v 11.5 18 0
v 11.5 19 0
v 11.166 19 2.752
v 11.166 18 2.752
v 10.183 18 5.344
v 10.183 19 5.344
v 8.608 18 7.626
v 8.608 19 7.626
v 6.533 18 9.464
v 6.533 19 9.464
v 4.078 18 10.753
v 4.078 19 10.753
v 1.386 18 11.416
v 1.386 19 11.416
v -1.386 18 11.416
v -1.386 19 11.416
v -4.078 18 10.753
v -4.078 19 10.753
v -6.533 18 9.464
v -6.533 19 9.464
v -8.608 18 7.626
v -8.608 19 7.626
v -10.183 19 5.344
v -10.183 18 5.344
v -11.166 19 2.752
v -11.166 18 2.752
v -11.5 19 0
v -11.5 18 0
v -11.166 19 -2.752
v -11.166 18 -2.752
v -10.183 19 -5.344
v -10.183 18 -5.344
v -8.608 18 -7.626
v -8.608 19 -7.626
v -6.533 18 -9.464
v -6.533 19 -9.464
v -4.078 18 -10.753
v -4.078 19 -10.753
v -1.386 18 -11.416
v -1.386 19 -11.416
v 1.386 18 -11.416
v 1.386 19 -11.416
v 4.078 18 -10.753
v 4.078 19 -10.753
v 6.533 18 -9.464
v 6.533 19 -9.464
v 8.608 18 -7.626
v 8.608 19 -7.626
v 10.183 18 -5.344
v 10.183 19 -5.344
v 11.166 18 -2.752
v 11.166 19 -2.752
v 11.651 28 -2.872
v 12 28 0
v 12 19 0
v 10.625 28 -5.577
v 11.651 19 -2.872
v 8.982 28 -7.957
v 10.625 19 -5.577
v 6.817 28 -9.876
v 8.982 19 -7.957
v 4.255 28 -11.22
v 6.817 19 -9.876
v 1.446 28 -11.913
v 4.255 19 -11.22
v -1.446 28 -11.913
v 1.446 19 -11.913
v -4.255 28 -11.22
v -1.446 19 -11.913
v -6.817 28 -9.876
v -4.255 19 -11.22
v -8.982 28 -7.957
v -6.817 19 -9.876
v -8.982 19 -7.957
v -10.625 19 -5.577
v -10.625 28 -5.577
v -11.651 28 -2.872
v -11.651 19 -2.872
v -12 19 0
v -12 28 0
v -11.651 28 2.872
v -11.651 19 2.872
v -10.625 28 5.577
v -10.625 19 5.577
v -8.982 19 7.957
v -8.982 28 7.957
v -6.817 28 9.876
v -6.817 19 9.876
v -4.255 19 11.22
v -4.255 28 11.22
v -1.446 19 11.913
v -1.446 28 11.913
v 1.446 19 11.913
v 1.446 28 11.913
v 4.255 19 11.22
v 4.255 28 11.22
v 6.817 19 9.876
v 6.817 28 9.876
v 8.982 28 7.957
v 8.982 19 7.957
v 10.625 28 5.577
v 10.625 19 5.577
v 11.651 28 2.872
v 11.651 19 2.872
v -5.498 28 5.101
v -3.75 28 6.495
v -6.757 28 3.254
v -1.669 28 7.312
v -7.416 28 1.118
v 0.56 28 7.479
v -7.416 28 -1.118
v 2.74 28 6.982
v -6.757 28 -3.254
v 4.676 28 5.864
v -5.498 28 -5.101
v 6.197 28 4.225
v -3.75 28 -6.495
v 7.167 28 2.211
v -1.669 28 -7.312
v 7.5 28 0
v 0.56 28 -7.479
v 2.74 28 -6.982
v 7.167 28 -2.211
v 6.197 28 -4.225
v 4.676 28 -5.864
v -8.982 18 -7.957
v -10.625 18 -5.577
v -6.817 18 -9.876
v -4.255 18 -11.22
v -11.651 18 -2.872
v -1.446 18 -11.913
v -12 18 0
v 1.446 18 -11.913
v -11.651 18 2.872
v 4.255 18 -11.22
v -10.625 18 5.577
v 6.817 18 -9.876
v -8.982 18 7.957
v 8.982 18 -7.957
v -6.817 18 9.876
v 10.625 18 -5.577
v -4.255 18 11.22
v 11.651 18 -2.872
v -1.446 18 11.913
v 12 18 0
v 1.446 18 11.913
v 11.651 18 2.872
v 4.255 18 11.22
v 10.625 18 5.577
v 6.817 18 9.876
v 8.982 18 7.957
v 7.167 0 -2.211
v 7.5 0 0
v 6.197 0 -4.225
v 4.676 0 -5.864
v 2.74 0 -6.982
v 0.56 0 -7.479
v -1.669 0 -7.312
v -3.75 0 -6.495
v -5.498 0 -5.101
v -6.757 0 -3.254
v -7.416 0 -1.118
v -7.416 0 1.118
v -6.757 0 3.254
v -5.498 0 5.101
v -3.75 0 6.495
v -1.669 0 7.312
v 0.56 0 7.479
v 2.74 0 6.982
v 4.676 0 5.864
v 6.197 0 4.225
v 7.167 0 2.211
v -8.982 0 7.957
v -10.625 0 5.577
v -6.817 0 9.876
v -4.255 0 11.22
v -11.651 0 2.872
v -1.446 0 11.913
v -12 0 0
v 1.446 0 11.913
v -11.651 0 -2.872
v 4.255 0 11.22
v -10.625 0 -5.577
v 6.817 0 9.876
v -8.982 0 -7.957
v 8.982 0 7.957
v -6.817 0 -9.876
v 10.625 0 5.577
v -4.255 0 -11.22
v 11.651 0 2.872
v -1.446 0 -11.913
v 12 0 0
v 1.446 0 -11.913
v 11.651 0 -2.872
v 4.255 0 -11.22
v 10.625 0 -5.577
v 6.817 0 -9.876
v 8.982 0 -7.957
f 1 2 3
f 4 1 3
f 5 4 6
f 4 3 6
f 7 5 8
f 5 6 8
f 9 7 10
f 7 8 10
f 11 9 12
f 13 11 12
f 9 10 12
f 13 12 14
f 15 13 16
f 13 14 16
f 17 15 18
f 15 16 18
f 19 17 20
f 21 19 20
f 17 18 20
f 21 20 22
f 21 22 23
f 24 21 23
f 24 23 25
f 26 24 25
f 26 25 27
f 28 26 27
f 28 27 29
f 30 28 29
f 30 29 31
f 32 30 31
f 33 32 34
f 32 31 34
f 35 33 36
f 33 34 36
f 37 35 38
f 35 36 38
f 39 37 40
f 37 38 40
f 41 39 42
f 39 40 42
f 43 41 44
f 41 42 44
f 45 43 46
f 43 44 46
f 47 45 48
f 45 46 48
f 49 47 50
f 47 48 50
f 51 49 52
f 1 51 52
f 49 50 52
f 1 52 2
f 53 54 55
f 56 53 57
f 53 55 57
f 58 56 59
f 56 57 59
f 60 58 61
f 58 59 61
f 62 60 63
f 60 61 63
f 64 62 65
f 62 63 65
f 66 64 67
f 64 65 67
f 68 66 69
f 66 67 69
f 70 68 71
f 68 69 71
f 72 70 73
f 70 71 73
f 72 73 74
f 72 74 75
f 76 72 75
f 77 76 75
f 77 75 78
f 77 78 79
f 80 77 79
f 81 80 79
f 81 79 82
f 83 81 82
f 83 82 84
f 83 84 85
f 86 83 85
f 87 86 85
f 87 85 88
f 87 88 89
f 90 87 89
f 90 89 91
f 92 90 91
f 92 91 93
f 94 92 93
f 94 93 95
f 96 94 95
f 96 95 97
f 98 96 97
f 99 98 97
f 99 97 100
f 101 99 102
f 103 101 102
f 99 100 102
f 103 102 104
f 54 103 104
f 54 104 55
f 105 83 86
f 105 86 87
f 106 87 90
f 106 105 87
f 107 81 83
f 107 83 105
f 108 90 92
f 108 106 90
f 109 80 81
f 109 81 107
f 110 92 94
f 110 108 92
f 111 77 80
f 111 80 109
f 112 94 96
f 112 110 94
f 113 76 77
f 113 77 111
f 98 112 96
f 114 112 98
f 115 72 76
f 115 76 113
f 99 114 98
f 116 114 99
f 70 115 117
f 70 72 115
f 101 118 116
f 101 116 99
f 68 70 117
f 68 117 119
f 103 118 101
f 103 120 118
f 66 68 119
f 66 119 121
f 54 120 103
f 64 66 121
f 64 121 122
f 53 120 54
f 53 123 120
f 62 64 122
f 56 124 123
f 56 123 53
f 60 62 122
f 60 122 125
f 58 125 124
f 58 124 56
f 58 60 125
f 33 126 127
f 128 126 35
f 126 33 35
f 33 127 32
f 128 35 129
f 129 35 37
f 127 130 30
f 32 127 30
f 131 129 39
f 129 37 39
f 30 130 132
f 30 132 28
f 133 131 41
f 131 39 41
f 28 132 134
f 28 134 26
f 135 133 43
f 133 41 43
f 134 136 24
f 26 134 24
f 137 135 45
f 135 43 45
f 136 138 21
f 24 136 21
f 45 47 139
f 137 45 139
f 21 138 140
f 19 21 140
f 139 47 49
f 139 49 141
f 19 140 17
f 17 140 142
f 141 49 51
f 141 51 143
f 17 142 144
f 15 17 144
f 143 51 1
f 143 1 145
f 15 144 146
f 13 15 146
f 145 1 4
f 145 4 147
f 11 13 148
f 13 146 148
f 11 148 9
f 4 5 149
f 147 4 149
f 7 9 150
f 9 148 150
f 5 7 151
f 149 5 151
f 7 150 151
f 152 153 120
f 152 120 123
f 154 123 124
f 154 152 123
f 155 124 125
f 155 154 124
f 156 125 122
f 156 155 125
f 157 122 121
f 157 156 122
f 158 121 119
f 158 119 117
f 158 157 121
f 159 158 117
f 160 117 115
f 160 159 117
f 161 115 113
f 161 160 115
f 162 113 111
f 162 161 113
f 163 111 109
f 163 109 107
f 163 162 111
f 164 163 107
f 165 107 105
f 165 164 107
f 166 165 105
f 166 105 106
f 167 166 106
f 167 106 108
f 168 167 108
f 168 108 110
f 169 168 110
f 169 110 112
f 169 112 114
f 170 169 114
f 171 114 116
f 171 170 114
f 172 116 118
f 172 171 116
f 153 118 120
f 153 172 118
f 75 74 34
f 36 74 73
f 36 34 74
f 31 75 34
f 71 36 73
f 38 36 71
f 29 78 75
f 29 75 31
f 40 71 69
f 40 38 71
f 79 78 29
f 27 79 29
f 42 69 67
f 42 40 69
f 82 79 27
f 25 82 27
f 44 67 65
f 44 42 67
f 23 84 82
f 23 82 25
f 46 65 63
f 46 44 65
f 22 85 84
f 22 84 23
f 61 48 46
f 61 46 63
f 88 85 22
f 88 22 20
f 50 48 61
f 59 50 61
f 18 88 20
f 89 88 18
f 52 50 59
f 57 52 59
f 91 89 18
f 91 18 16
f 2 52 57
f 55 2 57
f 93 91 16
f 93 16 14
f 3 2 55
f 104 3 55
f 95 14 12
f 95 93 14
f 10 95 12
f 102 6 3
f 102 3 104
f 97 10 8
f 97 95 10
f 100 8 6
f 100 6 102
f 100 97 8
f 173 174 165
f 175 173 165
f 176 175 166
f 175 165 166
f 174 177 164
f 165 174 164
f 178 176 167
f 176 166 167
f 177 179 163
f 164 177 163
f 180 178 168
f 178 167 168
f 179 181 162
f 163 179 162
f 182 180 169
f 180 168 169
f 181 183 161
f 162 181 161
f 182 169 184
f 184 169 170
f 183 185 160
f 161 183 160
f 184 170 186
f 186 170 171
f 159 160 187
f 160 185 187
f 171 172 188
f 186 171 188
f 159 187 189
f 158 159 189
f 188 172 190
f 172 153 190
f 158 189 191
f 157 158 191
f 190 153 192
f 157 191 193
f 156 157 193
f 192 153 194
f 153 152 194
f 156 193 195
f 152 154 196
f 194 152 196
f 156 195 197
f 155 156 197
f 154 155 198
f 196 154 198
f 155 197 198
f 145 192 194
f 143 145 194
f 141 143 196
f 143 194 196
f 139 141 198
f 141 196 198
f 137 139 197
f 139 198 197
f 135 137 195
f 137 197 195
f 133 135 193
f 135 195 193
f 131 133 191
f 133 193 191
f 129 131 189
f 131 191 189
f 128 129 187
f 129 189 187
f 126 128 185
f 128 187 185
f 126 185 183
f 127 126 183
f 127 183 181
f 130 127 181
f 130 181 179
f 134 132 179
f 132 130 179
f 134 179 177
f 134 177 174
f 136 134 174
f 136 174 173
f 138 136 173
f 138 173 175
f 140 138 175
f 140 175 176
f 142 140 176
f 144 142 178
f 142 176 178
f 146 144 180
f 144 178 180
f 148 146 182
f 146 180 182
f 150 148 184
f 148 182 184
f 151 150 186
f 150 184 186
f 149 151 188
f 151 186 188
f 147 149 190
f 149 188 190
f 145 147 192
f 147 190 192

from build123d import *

# Parameters (mm, degrees)
SKIZZE1_R                       = 12
SKIZZE1_R_2                     = 7.5
AUFSATZ_LINEAR_AUSTRAGEN1_DEPTH = 28
SCHNITT_LINEAR_START            = 9
SKIZZE2_R                       = 12
SKIZZE2_R_2                     = 11.5
SCHNITT_LINEAR_AUSTRAGEN1_DEPTH = 1


with BuildPart() as part:
    # Skizze1 → Aufsatz-Linear austragen1 (new body)
    with BuildSketch(Plane(origin=(0, 0, 0), x_dir=(1, 0, 0), z_dir=(0, 1, 0))):
        Circle(SKIZZE1_R)
        Circle(SKIZZE1_R_2, mode=Mode.SUBTRACT)
    extrude(amount=AUFSATZ_LINEAR_AUSTRAGEN1_DEPTH)

    # Skizze2 → Schnitt-Linear austragen1 (cut)
    with BuildSketch(Plane.XZ.offset(-28).offset(SCHNITT_LINEAR_START)):
        Circle(SKIZZE2_R)
        Circle(SKIZZE2_R_2, mode=Mode.SUBTRACT)
    extrude(amount=SCHNITT_LINEAR_AUSTRAGEN1_DEPTH, mode=Mode.SUBTRACT)


solid = part.part
